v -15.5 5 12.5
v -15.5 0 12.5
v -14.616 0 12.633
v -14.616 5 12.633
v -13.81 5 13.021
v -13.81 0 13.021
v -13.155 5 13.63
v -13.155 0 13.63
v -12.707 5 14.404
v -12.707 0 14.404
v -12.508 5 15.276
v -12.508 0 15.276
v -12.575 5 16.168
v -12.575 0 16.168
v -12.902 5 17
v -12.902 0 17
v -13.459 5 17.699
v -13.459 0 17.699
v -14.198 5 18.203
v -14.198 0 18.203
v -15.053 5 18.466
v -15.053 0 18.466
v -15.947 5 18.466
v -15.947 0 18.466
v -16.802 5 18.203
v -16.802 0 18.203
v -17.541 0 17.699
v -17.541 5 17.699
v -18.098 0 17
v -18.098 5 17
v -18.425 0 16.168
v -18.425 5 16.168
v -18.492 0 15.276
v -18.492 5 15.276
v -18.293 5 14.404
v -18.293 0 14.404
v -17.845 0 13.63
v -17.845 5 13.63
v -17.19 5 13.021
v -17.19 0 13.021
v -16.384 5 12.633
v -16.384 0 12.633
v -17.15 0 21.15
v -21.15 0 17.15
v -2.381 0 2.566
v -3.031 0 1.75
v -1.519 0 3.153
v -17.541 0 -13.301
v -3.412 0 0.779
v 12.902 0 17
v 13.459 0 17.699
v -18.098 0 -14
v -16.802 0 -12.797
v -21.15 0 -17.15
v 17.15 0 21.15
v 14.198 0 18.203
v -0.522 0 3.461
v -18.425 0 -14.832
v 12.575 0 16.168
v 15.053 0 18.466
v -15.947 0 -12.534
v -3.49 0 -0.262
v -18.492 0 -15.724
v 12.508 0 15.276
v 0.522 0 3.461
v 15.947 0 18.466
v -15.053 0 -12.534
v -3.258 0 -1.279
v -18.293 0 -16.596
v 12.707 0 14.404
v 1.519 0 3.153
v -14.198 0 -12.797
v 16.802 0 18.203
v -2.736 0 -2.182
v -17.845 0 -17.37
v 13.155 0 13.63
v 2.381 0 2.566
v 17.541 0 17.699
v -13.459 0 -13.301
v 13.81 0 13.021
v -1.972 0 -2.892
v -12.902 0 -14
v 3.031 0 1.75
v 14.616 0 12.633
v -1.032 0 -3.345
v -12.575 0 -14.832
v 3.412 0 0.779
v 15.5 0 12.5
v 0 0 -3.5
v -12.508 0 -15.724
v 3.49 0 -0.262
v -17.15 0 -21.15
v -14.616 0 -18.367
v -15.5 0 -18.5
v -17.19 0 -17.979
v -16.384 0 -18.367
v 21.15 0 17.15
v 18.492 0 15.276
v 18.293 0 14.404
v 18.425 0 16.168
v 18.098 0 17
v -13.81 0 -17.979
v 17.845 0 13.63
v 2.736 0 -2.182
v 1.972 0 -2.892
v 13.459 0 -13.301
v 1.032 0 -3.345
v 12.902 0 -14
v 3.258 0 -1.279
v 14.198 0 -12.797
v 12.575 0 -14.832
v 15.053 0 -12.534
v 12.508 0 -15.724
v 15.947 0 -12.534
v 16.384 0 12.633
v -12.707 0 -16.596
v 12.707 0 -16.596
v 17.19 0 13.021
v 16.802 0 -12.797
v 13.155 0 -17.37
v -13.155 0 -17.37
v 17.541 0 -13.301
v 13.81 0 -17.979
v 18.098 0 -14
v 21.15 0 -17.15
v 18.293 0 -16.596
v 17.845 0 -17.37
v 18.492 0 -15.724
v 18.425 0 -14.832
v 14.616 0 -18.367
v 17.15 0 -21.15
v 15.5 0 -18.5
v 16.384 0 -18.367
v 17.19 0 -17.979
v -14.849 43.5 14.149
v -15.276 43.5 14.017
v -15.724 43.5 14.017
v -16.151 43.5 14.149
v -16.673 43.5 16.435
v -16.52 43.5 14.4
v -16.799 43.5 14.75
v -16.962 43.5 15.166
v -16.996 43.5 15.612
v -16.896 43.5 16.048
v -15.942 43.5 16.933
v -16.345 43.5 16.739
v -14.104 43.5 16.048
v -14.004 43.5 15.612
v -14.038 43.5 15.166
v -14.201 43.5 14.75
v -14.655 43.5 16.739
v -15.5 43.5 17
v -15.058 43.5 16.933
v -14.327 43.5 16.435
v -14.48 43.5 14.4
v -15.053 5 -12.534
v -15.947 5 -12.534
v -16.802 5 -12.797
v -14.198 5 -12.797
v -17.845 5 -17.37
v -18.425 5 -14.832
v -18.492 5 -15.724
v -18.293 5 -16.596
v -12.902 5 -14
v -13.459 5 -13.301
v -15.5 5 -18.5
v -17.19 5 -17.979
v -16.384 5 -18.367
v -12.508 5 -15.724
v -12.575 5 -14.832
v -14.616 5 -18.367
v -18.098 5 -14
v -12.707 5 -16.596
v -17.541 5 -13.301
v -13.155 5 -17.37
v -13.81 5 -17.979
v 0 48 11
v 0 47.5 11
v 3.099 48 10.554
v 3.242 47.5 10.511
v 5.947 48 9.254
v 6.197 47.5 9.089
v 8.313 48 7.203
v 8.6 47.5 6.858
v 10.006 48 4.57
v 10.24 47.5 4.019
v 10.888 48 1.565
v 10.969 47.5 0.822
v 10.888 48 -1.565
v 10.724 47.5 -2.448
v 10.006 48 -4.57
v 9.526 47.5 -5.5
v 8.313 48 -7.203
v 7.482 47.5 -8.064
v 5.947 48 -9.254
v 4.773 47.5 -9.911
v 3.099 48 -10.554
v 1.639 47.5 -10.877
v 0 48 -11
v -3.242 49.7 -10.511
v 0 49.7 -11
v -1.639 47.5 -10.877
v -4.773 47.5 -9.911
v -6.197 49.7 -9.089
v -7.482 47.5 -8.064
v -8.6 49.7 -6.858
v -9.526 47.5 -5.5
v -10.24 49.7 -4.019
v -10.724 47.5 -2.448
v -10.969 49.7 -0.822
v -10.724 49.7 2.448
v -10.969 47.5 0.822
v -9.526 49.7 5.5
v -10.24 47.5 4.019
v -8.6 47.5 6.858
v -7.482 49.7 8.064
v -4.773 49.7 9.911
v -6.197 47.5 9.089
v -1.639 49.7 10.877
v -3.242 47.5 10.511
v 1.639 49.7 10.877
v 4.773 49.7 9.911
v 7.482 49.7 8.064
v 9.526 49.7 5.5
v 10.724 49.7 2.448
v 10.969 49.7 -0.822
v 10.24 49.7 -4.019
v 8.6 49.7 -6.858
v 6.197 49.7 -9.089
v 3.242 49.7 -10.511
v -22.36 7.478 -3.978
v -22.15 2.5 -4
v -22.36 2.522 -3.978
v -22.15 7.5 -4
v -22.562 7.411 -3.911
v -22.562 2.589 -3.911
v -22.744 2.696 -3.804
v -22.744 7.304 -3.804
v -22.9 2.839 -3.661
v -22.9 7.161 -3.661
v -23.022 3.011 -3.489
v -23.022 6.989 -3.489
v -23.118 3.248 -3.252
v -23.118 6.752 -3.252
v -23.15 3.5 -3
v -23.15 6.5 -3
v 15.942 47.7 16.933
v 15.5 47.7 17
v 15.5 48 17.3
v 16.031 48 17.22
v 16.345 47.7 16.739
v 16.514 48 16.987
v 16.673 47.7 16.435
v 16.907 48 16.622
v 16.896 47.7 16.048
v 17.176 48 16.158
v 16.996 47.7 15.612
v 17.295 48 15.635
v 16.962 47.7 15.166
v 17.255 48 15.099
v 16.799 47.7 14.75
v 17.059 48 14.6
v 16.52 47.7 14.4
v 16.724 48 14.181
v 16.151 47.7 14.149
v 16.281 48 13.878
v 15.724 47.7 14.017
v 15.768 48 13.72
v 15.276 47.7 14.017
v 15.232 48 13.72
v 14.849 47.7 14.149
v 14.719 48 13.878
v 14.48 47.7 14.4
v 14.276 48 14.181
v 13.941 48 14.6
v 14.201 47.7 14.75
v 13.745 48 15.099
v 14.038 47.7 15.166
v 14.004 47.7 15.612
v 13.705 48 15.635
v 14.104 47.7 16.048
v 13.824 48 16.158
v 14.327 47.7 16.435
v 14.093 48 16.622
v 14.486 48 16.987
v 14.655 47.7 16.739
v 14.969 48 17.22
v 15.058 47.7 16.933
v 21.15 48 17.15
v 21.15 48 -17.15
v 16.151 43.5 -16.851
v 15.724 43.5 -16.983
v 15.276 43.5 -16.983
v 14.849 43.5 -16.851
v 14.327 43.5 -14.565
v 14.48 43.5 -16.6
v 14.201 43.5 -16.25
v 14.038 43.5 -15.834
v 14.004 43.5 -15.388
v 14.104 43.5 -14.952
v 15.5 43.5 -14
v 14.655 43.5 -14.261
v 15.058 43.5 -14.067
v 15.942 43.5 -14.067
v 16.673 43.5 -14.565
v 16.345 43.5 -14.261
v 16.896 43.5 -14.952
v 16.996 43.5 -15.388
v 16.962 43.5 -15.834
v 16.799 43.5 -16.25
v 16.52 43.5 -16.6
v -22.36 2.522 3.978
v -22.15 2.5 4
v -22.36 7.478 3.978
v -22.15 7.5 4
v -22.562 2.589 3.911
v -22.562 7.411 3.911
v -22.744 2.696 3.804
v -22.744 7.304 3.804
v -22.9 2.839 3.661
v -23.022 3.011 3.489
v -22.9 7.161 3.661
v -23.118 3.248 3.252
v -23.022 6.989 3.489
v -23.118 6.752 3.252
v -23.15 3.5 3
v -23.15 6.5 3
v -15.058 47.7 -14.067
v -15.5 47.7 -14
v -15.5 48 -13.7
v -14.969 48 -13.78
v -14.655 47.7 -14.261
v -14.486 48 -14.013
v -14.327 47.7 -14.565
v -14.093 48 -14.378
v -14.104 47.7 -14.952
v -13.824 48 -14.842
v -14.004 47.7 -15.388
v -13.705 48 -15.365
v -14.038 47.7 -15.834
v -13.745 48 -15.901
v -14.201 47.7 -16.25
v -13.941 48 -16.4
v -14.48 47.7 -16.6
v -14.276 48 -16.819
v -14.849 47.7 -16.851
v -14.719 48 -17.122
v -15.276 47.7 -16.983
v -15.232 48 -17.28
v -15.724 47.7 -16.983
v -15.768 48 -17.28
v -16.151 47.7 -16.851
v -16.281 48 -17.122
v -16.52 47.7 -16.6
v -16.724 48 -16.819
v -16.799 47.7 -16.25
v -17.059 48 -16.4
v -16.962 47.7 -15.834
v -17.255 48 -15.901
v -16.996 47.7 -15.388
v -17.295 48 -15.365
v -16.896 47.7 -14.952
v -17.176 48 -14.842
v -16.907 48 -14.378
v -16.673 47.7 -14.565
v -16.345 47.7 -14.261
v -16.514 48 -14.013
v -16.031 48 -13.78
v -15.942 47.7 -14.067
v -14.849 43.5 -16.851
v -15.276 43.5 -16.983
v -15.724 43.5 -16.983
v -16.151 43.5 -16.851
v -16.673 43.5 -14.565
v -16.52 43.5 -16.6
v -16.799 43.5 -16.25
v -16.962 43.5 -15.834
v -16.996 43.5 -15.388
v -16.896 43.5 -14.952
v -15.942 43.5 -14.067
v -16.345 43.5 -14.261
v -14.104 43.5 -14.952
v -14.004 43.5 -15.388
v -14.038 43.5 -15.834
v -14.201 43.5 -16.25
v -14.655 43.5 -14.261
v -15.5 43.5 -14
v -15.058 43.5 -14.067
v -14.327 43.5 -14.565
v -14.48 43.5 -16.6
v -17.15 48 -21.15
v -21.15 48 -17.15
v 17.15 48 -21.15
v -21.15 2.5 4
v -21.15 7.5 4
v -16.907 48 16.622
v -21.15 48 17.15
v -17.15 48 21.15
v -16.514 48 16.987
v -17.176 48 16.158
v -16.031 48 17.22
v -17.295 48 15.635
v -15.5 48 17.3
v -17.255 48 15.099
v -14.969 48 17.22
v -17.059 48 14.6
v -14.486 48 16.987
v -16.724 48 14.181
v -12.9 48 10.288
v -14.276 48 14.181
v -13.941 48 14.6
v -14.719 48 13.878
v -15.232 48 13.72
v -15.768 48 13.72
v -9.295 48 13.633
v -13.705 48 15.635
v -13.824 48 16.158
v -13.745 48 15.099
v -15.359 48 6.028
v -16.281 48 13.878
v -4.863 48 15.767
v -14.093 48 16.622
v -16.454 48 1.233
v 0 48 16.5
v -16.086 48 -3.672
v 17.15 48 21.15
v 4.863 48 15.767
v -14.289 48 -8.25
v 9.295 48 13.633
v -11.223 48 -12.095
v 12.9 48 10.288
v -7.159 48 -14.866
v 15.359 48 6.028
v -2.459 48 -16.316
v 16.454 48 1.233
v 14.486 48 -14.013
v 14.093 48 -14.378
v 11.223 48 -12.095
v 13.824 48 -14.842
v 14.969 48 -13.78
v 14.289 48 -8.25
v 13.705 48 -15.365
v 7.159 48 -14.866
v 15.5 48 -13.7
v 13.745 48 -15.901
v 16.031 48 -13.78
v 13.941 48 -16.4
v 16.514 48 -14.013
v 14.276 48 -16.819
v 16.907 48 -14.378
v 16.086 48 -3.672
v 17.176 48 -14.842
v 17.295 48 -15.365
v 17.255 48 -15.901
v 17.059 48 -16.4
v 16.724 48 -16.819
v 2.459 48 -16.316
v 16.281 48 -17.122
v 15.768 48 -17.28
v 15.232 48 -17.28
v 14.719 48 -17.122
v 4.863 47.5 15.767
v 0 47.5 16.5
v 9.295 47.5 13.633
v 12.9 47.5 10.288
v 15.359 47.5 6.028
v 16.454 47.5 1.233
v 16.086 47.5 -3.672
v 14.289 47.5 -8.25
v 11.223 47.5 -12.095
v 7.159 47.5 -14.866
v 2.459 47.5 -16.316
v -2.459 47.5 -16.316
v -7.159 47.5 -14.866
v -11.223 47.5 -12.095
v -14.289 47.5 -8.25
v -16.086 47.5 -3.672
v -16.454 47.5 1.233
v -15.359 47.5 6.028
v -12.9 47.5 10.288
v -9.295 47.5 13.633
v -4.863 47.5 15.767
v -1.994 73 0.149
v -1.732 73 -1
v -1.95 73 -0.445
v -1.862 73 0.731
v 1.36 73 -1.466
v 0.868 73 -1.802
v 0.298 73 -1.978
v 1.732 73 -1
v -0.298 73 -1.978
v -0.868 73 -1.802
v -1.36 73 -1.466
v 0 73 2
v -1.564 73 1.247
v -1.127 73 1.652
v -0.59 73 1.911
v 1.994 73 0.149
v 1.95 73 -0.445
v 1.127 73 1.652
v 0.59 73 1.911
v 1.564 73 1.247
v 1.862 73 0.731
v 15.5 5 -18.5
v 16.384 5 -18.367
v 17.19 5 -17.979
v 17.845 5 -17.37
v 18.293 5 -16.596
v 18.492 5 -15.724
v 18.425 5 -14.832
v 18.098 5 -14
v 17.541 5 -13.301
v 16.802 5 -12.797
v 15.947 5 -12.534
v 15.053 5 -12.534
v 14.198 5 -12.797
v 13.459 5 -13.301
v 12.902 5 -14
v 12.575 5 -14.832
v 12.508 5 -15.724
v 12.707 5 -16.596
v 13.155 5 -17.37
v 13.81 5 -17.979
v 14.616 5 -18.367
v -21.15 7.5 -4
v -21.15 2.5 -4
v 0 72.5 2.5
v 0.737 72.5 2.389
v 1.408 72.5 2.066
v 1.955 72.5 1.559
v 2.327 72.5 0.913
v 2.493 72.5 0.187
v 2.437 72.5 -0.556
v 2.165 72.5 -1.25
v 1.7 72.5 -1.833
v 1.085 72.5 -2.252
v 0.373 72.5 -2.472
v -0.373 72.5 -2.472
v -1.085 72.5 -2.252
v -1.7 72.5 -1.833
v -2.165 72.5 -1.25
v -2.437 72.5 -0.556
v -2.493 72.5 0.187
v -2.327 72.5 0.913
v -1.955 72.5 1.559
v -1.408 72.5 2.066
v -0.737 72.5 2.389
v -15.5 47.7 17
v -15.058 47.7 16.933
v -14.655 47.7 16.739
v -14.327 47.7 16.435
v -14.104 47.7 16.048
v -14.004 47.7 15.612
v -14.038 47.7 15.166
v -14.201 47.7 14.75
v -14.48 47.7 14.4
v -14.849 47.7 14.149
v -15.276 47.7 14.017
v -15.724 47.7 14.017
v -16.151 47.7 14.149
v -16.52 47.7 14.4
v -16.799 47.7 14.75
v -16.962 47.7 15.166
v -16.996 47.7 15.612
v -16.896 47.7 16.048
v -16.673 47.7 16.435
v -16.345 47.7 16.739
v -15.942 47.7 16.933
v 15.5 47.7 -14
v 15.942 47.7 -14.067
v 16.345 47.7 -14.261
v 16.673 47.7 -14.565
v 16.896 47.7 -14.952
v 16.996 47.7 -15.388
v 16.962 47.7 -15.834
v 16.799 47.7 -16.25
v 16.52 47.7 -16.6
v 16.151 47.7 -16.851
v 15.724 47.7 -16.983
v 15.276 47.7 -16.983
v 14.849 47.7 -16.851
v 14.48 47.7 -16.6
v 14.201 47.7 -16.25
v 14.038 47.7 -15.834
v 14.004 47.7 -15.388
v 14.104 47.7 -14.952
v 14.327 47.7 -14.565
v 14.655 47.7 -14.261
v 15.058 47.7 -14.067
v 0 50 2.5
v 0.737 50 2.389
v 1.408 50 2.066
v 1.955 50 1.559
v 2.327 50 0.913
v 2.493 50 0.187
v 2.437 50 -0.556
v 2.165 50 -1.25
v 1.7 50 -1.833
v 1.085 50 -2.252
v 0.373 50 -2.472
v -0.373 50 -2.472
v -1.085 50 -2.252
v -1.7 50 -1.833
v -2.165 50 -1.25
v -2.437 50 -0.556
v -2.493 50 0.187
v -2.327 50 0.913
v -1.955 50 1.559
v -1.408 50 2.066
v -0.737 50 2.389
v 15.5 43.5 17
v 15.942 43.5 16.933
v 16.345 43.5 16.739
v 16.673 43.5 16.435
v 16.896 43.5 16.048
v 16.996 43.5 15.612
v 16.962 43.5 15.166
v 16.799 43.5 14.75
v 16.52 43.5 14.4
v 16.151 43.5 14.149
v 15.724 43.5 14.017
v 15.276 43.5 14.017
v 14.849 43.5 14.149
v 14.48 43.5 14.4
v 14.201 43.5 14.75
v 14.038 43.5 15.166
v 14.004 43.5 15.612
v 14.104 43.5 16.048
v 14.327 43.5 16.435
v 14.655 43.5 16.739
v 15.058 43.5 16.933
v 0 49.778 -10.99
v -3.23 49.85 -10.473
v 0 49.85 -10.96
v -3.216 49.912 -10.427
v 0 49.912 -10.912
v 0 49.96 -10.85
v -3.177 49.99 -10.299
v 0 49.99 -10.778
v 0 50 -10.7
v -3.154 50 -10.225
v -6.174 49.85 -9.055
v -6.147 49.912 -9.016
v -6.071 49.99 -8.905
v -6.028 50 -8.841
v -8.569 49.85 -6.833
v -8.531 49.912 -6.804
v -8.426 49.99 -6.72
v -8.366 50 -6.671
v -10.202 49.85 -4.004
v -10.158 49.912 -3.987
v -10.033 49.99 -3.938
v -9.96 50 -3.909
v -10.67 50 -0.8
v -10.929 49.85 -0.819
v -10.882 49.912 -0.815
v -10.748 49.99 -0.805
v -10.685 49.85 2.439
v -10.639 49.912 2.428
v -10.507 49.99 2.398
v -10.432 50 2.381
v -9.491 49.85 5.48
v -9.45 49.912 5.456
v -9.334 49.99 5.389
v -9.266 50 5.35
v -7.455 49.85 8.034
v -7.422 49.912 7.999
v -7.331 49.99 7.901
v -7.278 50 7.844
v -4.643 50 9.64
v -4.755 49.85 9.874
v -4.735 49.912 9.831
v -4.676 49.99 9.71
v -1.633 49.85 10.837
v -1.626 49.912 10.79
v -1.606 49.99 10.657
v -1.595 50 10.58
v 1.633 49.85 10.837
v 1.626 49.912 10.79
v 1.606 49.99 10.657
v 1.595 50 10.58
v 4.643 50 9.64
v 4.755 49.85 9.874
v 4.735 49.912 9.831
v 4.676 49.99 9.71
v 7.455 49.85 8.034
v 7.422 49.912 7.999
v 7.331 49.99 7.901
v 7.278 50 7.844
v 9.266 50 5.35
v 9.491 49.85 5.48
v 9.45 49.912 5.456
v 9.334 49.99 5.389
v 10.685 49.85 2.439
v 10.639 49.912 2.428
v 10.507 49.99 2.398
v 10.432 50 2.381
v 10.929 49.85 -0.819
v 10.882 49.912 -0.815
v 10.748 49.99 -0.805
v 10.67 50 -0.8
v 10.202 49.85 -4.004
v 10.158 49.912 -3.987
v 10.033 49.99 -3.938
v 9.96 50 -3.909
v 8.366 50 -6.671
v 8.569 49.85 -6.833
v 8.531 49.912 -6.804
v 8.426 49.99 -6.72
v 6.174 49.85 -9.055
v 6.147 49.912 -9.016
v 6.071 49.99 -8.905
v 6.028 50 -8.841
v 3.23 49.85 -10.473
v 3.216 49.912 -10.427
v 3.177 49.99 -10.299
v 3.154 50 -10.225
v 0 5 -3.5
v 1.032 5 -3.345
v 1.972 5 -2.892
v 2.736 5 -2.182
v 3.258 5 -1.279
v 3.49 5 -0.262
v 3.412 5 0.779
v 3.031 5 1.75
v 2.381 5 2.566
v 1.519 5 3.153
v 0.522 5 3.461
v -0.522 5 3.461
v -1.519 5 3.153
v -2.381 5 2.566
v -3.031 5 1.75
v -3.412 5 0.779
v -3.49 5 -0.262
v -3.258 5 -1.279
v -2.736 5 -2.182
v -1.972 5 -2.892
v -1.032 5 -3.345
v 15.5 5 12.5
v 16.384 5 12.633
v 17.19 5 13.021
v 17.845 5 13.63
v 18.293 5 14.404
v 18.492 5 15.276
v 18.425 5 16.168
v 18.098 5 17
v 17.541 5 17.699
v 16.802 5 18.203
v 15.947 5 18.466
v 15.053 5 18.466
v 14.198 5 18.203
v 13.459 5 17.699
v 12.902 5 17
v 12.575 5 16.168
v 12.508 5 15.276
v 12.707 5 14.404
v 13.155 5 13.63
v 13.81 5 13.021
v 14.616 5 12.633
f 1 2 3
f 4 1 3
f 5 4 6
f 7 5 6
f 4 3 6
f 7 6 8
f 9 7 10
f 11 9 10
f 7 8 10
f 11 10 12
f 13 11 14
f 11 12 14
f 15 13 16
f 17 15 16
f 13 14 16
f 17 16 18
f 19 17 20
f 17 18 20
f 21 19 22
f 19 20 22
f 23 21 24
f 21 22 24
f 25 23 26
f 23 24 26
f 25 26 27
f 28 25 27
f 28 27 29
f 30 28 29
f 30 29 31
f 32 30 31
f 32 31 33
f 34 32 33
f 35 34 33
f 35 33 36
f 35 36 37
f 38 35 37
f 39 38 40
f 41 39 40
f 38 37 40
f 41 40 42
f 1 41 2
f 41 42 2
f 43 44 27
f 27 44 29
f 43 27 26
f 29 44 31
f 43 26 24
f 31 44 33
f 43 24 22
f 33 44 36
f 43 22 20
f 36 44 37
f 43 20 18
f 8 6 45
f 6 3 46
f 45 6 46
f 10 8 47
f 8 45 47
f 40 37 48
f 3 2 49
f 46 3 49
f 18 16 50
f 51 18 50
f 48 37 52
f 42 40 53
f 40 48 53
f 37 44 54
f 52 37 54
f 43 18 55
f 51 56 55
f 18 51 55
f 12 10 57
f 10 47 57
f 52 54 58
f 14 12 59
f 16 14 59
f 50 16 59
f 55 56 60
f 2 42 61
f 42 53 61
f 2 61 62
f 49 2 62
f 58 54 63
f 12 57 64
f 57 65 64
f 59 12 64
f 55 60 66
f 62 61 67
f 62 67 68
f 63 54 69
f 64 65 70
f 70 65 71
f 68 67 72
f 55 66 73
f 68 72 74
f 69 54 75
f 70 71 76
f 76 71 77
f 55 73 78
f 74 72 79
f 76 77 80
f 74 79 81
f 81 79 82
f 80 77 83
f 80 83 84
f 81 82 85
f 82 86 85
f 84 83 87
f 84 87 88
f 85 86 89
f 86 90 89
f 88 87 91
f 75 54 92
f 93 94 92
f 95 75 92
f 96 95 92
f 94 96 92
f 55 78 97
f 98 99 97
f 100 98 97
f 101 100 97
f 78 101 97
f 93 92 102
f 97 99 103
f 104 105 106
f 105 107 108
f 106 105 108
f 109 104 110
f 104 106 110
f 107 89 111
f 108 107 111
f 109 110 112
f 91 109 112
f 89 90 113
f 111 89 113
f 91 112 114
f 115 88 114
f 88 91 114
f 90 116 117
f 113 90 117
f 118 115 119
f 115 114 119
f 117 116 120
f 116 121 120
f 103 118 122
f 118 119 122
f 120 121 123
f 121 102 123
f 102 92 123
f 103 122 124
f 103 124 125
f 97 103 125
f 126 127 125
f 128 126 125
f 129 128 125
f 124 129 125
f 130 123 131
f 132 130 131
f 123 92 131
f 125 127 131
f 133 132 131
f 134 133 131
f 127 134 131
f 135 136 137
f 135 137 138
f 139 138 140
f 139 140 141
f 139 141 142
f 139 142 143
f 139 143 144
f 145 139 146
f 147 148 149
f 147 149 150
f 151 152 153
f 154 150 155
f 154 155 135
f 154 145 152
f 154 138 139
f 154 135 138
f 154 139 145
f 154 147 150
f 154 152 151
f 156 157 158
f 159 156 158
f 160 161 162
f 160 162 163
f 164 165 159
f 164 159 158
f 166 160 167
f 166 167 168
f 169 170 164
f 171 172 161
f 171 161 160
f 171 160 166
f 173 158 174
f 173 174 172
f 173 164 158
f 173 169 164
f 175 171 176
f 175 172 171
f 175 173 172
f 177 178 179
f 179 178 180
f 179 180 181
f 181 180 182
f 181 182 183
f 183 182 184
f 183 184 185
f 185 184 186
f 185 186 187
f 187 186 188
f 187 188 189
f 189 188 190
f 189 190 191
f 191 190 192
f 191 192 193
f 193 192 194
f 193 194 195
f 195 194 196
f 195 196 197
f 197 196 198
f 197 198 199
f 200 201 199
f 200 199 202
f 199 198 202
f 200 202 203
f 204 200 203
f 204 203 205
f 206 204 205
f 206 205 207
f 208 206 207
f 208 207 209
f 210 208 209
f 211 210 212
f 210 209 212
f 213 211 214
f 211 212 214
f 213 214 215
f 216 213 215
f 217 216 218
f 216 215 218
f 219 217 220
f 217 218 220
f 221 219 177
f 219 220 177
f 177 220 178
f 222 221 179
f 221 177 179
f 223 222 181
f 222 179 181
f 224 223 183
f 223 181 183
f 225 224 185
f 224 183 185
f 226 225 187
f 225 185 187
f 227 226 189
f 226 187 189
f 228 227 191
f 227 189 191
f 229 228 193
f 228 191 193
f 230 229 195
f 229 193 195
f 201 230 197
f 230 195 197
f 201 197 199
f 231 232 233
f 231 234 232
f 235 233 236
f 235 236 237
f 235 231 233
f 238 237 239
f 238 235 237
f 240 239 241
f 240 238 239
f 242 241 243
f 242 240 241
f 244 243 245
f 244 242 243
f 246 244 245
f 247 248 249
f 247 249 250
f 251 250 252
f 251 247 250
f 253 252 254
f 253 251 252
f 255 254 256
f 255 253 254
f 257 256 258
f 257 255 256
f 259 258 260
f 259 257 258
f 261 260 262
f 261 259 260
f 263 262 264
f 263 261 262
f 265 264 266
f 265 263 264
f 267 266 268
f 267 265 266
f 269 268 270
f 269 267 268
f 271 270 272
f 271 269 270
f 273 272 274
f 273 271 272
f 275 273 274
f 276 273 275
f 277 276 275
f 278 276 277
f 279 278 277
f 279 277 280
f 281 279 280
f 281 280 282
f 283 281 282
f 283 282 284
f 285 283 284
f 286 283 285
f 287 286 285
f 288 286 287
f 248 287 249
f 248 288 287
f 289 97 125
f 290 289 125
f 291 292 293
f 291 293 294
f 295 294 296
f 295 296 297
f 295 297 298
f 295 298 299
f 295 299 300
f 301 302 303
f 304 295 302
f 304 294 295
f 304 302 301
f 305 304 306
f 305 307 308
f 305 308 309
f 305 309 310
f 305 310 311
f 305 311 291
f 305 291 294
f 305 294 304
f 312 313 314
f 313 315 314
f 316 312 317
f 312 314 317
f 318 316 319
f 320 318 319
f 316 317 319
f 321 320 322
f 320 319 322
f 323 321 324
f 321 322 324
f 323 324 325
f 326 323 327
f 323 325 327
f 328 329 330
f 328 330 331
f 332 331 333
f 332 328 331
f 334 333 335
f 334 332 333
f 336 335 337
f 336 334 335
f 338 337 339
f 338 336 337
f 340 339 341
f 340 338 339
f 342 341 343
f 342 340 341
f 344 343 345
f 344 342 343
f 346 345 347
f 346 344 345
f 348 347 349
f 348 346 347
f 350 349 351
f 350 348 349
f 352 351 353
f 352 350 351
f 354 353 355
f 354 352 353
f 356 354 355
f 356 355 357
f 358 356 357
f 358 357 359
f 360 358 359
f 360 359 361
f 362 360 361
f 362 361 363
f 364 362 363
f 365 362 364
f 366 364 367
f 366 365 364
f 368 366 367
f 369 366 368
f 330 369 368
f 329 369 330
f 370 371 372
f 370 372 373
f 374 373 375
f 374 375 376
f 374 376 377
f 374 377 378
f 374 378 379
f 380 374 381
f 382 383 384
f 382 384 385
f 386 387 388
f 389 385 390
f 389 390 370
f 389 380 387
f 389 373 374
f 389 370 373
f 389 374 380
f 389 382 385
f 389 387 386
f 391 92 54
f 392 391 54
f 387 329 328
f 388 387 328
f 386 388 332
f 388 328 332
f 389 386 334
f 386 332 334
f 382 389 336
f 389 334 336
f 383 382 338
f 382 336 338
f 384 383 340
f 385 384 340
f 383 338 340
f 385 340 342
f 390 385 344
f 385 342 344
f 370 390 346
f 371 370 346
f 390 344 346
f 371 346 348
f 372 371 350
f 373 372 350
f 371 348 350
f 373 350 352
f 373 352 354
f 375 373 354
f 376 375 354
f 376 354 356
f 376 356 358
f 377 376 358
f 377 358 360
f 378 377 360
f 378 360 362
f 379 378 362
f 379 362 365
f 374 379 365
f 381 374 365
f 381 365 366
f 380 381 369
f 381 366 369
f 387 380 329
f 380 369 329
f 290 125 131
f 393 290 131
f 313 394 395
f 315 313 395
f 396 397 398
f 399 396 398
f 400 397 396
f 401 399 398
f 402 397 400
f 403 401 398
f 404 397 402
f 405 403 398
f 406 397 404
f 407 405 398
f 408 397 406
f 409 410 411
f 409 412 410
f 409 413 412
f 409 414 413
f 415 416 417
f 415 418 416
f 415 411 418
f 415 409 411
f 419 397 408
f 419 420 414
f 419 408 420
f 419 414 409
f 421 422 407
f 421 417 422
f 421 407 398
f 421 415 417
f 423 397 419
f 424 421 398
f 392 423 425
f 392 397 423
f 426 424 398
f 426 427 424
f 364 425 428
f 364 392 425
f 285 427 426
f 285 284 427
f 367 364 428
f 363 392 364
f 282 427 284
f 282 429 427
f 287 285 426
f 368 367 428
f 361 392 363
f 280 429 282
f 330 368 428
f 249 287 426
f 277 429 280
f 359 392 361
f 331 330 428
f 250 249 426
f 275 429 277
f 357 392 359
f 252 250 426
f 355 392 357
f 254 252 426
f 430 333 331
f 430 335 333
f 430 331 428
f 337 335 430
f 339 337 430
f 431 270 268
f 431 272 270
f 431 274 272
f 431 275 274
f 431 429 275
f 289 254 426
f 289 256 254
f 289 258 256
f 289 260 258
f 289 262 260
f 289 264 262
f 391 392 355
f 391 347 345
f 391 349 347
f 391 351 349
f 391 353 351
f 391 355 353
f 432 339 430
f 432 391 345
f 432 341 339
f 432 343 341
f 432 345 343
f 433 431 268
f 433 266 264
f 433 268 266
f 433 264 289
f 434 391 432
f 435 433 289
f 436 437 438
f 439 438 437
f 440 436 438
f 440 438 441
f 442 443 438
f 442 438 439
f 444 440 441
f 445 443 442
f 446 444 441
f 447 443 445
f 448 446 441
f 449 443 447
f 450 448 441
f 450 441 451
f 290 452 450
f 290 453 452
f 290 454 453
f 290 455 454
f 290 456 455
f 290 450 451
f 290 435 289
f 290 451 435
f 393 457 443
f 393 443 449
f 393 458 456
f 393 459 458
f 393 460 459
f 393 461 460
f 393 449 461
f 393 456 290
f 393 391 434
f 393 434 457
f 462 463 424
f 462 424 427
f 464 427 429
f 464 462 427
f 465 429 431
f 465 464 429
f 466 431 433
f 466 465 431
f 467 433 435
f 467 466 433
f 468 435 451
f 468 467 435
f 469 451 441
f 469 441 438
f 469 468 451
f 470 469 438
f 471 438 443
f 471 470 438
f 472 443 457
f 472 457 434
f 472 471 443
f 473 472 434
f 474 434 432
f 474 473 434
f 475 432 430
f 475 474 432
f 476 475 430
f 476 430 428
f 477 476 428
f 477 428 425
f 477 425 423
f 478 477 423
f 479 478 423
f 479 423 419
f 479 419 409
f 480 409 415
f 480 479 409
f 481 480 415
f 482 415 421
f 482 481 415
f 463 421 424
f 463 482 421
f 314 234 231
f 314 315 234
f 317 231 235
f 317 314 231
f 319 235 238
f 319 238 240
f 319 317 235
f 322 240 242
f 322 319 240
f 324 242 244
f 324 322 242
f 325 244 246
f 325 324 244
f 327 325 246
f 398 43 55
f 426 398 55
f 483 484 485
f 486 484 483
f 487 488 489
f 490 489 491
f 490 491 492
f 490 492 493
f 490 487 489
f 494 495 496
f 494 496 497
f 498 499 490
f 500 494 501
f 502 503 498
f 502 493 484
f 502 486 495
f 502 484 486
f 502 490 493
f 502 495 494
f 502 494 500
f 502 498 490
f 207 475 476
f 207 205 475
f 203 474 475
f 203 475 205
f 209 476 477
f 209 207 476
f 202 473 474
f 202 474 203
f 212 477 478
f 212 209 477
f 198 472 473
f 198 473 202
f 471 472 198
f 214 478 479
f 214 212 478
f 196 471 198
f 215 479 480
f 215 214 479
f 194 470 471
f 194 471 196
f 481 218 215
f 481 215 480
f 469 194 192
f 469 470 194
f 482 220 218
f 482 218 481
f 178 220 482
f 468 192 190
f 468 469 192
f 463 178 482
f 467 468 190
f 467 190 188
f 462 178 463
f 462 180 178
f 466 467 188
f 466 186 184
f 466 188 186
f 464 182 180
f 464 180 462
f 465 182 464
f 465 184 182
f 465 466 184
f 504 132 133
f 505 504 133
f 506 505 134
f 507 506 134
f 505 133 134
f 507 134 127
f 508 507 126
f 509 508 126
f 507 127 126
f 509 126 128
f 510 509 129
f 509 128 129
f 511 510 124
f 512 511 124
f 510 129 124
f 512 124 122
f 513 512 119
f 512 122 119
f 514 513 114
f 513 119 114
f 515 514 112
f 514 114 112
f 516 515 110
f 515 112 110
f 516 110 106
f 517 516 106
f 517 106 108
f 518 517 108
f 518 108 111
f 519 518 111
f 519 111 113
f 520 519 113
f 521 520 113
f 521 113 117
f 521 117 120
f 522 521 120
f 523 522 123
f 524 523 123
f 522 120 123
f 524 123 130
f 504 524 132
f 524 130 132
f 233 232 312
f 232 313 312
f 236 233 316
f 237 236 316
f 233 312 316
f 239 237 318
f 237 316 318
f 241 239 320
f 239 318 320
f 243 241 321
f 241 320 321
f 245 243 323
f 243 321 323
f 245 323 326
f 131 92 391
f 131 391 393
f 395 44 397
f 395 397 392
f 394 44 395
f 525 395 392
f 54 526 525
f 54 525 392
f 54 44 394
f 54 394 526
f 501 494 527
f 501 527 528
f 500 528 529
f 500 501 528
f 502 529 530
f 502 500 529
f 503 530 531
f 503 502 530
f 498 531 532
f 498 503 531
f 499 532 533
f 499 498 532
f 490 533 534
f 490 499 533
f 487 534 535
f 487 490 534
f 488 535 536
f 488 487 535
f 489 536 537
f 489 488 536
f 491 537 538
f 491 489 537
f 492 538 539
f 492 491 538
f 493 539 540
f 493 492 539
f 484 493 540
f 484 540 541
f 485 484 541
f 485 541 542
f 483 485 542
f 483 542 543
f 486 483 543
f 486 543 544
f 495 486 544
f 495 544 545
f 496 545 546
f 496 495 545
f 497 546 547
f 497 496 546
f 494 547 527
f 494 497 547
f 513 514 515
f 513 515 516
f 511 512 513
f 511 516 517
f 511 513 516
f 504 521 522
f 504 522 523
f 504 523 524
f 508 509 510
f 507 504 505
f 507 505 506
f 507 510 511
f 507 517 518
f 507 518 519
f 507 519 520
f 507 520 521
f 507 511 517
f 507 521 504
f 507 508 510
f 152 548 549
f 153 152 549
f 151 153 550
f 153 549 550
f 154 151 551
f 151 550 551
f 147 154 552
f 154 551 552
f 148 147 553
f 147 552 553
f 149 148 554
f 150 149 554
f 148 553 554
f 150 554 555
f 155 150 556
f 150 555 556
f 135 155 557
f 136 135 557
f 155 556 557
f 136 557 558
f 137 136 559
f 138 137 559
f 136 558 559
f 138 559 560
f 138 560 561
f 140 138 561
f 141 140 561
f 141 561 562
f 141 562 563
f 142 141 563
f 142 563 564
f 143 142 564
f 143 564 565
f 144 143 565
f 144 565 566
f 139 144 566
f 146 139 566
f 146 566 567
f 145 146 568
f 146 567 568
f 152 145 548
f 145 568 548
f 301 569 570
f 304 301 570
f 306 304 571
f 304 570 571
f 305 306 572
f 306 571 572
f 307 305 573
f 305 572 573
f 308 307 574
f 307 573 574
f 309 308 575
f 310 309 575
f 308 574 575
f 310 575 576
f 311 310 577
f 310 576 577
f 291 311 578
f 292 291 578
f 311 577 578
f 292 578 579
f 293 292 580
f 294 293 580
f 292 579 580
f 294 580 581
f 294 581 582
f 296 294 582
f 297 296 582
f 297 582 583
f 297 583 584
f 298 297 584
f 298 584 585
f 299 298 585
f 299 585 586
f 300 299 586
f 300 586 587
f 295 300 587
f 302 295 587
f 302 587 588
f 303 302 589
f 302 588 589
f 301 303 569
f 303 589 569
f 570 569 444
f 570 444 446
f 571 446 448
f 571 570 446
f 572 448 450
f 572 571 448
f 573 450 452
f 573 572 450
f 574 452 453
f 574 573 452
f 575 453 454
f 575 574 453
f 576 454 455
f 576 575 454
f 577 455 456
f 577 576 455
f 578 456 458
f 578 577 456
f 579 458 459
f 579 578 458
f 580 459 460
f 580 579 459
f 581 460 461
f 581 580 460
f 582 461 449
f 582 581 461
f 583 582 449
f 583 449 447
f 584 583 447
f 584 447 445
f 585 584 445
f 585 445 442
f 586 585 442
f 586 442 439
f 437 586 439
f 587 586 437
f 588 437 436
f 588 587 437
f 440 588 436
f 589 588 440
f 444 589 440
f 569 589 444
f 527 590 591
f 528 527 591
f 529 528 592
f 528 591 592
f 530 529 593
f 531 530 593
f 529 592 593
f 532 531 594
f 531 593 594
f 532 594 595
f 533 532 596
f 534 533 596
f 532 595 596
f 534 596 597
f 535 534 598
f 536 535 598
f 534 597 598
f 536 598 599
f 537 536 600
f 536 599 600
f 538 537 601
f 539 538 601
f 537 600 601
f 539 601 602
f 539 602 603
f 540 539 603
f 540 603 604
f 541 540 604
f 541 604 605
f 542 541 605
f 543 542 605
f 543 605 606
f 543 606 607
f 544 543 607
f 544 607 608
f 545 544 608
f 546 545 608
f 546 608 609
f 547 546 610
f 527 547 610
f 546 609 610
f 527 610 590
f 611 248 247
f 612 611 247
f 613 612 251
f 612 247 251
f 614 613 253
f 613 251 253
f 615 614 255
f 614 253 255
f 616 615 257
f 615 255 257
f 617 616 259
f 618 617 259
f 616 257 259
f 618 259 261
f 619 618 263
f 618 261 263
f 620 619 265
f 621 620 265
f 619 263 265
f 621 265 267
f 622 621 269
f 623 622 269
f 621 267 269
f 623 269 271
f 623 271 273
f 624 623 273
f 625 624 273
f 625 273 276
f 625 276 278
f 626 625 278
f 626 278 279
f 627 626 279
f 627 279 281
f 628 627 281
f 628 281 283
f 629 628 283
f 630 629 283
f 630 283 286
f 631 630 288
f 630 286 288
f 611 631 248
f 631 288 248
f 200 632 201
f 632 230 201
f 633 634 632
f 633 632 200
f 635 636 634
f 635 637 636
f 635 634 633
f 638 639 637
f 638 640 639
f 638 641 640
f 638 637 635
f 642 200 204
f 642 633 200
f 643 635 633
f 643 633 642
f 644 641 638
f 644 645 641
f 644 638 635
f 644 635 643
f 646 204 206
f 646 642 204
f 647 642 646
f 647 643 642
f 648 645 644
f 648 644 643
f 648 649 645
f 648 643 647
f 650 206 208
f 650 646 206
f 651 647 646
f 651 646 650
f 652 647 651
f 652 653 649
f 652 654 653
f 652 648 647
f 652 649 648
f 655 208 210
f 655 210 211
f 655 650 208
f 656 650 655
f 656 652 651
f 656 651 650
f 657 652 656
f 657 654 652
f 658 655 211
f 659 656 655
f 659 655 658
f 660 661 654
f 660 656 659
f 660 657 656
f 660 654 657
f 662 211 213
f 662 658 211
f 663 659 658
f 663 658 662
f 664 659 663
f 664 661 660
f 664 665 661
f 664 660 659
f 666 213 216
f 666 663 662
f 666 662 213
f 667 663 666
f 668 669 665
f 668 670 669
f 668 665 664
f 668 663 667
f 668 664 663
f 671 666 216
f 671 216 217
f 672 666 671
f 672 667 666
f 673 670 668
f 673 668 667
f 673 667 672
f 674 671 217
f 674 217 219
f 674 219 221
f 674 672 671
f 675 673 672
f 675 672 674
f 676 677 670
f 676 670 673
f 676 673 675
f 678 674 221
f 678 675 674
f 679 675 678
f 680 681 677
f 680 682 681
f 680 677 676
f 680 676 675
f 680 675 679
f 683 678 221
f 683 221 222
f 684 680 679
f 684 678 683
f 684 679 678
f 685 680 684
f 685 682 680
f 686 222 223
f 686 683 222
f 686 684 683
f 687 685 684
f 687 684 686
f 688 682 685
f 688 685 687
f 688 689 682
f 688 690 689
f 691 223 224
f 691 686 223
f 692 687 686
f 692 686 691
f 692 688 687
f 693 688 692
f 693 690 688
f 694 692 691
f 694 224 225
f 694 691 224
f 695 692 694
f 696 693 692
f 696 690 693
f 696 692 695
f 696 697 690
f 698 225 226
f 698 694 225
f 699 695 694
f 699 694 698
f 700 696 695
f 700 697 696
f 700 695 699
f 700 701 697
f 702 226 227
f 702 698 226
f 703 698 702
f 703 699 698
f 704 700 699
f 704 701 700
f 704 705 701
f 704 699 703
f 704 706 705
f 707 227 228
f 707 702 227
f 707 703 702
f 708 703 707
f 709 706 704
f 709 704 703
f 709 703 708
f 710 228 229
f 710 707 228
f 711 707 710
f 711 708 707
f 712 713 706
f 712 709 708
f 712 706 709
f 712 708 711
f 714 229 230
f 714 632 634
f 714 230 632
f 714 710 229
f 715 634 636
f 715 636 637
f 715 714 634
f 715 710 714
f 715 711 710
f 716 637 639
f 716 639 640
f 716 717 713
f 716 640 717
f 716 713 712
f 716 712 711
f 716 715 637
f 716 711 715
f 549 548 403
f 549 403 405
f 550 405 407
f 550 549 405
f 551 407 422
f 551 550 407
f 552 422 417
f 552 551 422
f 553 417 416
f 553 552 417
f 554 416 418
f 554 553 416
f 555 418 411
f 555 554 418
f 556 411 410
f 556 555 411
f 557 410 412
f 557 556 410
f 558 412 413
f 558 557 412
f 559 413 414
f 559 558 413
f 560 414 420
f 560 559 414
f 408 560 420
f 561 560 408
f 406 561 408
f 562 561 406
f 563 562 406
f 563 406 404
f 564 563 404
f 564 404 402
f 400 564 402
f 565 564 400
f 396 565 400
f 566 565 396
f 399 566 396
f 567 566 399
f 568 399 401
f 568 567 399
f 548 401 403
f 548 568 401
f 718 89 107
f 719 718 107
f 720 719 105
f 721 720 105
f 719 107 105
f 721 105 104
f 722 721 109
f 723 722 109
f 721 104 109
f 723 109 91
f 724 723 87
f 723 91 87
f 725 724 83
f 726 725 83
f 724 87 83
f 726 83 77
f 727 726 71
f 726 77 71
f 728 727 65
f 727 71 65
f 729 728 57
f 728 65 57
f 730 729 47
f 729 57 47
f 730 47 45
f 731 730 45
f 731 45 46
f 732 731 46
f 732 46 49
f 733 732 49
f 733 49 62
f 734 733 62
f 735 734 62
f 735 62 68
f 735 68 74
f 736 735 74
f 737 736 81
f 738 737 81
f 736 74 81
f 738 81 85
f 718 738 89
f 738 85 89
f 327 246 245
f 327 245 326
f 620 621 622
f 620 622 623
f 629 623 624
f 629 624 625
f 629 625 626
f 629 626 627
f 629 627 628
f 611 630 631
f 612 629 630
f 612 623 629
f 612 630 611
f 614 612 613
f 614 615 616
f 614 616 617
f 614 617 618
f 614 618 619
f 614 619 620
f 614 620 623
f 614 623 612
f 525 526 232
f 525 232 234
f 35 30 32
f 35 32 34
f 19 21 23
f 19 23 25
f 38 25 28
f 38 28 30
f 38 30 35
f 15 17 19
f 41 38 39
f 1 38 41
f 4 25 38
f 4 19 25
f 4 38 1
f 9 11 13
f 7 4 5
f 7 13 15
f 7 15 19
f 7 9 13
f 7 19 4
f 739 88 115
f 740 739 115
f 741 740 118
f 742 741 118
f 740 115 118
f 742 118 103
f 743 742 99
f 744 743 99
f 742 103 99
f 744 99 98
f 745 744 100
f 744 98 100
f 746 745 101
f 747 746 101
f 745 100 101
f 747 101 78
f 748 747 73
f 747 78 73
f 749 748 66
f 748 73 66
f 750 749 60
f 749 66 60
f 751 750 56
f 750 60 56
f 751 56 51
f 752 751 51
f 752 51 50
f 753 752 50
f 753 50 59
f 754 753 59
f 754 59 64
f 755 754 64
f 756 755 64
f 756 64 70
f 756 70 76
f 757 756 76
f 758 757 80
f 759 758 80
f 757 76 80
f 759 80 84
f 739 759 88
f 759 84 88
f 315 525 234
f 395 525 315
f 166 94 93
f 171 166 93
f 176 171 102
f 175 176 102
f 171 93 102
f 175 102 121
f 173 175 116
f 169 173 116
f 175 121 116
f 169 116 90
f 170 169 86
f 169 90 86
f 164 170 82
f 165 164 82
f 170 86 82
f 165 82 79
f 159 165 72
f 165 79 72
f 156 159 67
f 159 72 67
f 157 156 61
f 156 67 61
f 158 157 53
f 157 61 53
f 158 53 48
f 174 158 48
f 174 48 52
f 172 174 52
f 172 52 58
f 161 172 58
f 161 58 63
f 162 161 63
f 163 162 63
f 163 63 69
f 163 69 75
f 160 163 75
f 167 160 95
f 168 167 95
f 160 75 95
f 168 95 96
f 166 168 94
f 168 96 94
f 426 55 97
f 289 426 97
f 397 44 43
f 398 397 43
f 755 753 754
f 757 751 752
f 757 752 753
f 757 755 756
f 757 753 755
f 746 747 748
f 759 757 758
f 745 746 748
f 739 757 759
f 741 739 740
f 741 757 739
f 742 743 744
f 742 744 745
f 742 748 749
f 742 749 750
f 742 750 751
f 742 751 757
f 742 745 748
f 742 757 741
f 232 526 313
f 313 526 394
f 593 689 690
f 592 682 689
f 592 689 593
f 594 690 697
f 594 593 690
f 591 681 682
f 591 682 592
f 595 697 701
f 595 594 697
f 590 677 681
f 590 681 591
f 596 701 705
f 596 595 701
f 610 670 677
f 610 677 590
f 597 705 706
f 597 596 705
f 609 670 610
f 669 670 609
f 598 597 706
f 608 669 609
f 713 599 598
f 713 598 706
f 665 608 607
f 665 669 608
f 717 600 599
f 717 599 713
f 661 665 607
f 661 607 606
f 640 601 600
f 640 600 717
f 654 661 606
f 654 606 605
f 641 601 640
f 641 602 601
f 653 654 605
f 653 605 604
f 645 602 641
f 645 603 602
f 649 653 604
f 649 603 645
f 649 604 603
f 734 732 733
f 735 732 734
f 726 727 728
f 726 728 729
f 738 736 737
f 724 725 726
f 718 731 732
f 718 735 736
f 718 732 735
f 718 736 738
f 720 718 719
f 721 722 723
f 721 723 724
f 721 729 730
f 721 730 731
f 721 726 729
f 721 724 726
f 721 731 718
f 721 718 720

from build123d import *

# Parameters (mm, degrees)
SKETCH1_W                    = 42.3
SKETCH1_H                    = 42.3
BOSS_EXTRUDE1_DEPTH          = 48
SKETCH2_R                    = 11
BOSS_EXTRUDE2_DEPTH          = 2
SKETCH3_R                    = 2.5
BOSS_EXTRUDE3_DEPTH          = 23
FILLET2_R                    = 0.3
CHAMFER1_SIZE                = 0.5
SKETCH4_R                    = 1.5
CUT_EXTRUDE1_DEPTH           = 4.5
CHAMFER2_SIZE                = 0.3
CUT_EXTRUDE2_START           = -0.5
SKETCH5_R                    = 16.5
SKETCH5_R_2                  = 11
CUT_EXTRUDE2_DEPTH           = 0.5
CUT_EXTRUDE_THIN1_DEPTH      = 57.556564606
CUT_EXTRUDE_THIN1_DEPTH_BACK = 57.556564606
SKETCH7_R                    = 3.5
SKETCH7_R_2                  = 3
CUT_EXTRUDE3_DEPTH           = 5
SKETCH8_W                    = 8
SKETCH8_H                    = 5
BOSS_EXTRUDE4_DEPTH          = 2
FILLET3_R                    = 1


with BuildPart() as part:
    # Sketch1 → Boss-Extrude1 (new body)
    with BuildSketch(Plane(origin=(0, 0, 0), x_dir=(1, 0, 0), z_dir=(0, 1, 0))):
        Rectangle(SKETCH1_W, SKETCH1_H)
    extrude(amount=BOSS_EXTRUDE1_DEPTH)

    # Sketch2 → Boss-Extrude2 (add)
    with BuildSketch(Plane(origin=(0, 48, 0), x_dir=(1, 0, 0), z_dir=(0, 1, 0))):
        with Locations(Location((0, 0, 0), (0, 0, 90))):
            Circle(SKETCH2_R)
    extrude(amount=BOSS_EXTRUDE2_DEPTH)

    # Sketch3 → Boss-Extrude3 (add)
    with BuildSketch(Plane(origin=(0, 50, 0), x_dir=(1, 0, 0), z_dir=(0, 1, 0))):
        with Locations(Location((0, 0, 0), (0, 0, 270))):
            Circle(SKETCH3_R)
    extrude(amount=BOSS_EXTRUDE3_DEPTH)

    # Fillet2
    fillet2_edges = [part.edges().sort_by_distance(p)[0] for p in [
        (0, 50, 11),
    ]]
    fillet(fillet2_edges, radius=FILLET2_R)

    # Chamfer1
    chamfer1_edges = [part.edges().sort_by_distance(p)[0] for p in [
        (0, 73, -2.5),
    ]]
    chamfer(chamfer1_edges, length=CHAMFER1_SIZE)

    # Sketch4 → Cut-Extrude1 (cut)
    with BuildSketch(Plane(origin=(0, 48, 0), x_dir=(1, 0, 0), z_dir=(0, 1, 0))):
        with Locations(Location((-15.5, -15.5, 0), (0, 0, 270))):
            Circle(SKETCH4_R)
        with Locations(Location((15.5, -15.5, 0), (0, 0, 270))):
            Circle(SKETCH4_R)
        with Locations(Location((15.5, 15.5, 0), (0, 0, 270))):
            Circle(SKETCH4_R)
        with Locations(Location((-15.5, 15.5, 0), (0, 0, 270))):
            Circle(SKETCH4_R)
    extrude(amount=-CUT_EXTRUDE1_DEPTH, mode=Mode.SUBTRACT)

    # Chamfer2
    chamfer2_edges = [part.edges().sort_by_distance(p)[0] for p in [
        (-15.5, 48, 14),
        (15.5, 48, 14),
        (15.5, 48, -17),
        (-15.5, 48, -17),
    ]]
    chamfer(chamfer2_edges, length=CHAMFER2_SIZE)

    # Sketch5 → Cut-Extrude2 (cut)
    with BuildSketch(Plane(origin=(0, 48, 0), x_dir=(1, 0, 0), z_dir=(0, 1, 0)).offset(CUT_EXTRUDE2_START)):
        with Locations(Location((0, 0, 0), (0, 0, 270))):
            Circle(SKETCH5_R)
        with Locations(Location((0, 0, 0), (0, 0, 270))):
            Circle(SKETCH5_R_2, mode=Mode.SUBTRACT)
    extrude(amount=CUT_EXTRUDE2_DEPTH, mode=Mode.SUBTRACT)

    # Sketch6 → Cut-Extrude-Thin1 (cut, two sides: drawn at the far end of the back side and taken through both)
    with BuildSketch(Plane(origin=(0, 48, 0), x_dir=(1, 0, 0), z_dir=(0, 1, 0)).offset(-CUT_EXTRUDE_THIN1_DEPTH_BACK)):
        Polygon((-21.15, -17.15), (-17.15, -21.15), (-24.221067812, -28.221067812), (-28.221067812, -24.221067812), align=None)
        Polygon((17.15, -21.15), (21.15, -17.15), (28.221067812, -24.221067812), (24.221067812, -28.221067812), align=None)
        Polygon((21.15, 17.15), (17.15, 21.15), (24.221067812, 28.221067812), (28.221067812, 24.221067812), align=None)
        Polygon((-17.15, 21.15), (-21.15, 17.15), (-28.221067812, 24.221067812), (-24.221067812, 28.221067812), align=None)
    extrude(amount=CUT_EXTRUDE_THIN1_DEPTH + CUT_EXTRUDE_THIN1_DEPTH_BACK, mode=Mode.SUBTRACT)

    # Sketch7 → Cut-Extrude3 (cut)
    with BuildSketch(Plane.XZ):
        with Locations(Location((0, 0, 0), (0, 0, 270))):
            Circle(SKETCH7_R)
        with Locations(Location((-15.5, 15.5, 0), (0, 0, 270))):
            Circle(SKETCH7_R_2)
        with Locations(Location((15.5, 15.5, 0), (0, 0, 270))):
            Circle(SKETCH7_R_2)
        with Locations(Location((15.5, -15.5, 0), (0, 0, 270))):
            Circle(SKETCH7_R_2)
        with Locations(Location((-15.5, -15.5, 0), (0, 0, 270))):
            Circle(SKETCH7_R_2)
    extrude(amount=-CUT_EXTRUDE3_DEPTH, mode=Mode.SUBTRACT)

    # Sketch8 → Boss-Extrude4 (add)
    with BuildSketch(Plane.ZY.offset(21.15)):
        with Locations((0, 5)):
            Rectangle(SKETCH8_W, SKETCH8_H)
    extrude(amount=BOSS_EXTRUDE4_DEPTH)

    # Fillet3
    fillet3_edges = [part.edges().sort_by_distance(p)[0] for p in [
        (-23.15, 5, 4),
        (-23.15, 7.5, 0),
        (-23.15, 5, -4),
        (-23.15, 2.5, 0),
    ]]
    fillet(fillet3_edges, radius=FILLET3_R)


solid = part.part
